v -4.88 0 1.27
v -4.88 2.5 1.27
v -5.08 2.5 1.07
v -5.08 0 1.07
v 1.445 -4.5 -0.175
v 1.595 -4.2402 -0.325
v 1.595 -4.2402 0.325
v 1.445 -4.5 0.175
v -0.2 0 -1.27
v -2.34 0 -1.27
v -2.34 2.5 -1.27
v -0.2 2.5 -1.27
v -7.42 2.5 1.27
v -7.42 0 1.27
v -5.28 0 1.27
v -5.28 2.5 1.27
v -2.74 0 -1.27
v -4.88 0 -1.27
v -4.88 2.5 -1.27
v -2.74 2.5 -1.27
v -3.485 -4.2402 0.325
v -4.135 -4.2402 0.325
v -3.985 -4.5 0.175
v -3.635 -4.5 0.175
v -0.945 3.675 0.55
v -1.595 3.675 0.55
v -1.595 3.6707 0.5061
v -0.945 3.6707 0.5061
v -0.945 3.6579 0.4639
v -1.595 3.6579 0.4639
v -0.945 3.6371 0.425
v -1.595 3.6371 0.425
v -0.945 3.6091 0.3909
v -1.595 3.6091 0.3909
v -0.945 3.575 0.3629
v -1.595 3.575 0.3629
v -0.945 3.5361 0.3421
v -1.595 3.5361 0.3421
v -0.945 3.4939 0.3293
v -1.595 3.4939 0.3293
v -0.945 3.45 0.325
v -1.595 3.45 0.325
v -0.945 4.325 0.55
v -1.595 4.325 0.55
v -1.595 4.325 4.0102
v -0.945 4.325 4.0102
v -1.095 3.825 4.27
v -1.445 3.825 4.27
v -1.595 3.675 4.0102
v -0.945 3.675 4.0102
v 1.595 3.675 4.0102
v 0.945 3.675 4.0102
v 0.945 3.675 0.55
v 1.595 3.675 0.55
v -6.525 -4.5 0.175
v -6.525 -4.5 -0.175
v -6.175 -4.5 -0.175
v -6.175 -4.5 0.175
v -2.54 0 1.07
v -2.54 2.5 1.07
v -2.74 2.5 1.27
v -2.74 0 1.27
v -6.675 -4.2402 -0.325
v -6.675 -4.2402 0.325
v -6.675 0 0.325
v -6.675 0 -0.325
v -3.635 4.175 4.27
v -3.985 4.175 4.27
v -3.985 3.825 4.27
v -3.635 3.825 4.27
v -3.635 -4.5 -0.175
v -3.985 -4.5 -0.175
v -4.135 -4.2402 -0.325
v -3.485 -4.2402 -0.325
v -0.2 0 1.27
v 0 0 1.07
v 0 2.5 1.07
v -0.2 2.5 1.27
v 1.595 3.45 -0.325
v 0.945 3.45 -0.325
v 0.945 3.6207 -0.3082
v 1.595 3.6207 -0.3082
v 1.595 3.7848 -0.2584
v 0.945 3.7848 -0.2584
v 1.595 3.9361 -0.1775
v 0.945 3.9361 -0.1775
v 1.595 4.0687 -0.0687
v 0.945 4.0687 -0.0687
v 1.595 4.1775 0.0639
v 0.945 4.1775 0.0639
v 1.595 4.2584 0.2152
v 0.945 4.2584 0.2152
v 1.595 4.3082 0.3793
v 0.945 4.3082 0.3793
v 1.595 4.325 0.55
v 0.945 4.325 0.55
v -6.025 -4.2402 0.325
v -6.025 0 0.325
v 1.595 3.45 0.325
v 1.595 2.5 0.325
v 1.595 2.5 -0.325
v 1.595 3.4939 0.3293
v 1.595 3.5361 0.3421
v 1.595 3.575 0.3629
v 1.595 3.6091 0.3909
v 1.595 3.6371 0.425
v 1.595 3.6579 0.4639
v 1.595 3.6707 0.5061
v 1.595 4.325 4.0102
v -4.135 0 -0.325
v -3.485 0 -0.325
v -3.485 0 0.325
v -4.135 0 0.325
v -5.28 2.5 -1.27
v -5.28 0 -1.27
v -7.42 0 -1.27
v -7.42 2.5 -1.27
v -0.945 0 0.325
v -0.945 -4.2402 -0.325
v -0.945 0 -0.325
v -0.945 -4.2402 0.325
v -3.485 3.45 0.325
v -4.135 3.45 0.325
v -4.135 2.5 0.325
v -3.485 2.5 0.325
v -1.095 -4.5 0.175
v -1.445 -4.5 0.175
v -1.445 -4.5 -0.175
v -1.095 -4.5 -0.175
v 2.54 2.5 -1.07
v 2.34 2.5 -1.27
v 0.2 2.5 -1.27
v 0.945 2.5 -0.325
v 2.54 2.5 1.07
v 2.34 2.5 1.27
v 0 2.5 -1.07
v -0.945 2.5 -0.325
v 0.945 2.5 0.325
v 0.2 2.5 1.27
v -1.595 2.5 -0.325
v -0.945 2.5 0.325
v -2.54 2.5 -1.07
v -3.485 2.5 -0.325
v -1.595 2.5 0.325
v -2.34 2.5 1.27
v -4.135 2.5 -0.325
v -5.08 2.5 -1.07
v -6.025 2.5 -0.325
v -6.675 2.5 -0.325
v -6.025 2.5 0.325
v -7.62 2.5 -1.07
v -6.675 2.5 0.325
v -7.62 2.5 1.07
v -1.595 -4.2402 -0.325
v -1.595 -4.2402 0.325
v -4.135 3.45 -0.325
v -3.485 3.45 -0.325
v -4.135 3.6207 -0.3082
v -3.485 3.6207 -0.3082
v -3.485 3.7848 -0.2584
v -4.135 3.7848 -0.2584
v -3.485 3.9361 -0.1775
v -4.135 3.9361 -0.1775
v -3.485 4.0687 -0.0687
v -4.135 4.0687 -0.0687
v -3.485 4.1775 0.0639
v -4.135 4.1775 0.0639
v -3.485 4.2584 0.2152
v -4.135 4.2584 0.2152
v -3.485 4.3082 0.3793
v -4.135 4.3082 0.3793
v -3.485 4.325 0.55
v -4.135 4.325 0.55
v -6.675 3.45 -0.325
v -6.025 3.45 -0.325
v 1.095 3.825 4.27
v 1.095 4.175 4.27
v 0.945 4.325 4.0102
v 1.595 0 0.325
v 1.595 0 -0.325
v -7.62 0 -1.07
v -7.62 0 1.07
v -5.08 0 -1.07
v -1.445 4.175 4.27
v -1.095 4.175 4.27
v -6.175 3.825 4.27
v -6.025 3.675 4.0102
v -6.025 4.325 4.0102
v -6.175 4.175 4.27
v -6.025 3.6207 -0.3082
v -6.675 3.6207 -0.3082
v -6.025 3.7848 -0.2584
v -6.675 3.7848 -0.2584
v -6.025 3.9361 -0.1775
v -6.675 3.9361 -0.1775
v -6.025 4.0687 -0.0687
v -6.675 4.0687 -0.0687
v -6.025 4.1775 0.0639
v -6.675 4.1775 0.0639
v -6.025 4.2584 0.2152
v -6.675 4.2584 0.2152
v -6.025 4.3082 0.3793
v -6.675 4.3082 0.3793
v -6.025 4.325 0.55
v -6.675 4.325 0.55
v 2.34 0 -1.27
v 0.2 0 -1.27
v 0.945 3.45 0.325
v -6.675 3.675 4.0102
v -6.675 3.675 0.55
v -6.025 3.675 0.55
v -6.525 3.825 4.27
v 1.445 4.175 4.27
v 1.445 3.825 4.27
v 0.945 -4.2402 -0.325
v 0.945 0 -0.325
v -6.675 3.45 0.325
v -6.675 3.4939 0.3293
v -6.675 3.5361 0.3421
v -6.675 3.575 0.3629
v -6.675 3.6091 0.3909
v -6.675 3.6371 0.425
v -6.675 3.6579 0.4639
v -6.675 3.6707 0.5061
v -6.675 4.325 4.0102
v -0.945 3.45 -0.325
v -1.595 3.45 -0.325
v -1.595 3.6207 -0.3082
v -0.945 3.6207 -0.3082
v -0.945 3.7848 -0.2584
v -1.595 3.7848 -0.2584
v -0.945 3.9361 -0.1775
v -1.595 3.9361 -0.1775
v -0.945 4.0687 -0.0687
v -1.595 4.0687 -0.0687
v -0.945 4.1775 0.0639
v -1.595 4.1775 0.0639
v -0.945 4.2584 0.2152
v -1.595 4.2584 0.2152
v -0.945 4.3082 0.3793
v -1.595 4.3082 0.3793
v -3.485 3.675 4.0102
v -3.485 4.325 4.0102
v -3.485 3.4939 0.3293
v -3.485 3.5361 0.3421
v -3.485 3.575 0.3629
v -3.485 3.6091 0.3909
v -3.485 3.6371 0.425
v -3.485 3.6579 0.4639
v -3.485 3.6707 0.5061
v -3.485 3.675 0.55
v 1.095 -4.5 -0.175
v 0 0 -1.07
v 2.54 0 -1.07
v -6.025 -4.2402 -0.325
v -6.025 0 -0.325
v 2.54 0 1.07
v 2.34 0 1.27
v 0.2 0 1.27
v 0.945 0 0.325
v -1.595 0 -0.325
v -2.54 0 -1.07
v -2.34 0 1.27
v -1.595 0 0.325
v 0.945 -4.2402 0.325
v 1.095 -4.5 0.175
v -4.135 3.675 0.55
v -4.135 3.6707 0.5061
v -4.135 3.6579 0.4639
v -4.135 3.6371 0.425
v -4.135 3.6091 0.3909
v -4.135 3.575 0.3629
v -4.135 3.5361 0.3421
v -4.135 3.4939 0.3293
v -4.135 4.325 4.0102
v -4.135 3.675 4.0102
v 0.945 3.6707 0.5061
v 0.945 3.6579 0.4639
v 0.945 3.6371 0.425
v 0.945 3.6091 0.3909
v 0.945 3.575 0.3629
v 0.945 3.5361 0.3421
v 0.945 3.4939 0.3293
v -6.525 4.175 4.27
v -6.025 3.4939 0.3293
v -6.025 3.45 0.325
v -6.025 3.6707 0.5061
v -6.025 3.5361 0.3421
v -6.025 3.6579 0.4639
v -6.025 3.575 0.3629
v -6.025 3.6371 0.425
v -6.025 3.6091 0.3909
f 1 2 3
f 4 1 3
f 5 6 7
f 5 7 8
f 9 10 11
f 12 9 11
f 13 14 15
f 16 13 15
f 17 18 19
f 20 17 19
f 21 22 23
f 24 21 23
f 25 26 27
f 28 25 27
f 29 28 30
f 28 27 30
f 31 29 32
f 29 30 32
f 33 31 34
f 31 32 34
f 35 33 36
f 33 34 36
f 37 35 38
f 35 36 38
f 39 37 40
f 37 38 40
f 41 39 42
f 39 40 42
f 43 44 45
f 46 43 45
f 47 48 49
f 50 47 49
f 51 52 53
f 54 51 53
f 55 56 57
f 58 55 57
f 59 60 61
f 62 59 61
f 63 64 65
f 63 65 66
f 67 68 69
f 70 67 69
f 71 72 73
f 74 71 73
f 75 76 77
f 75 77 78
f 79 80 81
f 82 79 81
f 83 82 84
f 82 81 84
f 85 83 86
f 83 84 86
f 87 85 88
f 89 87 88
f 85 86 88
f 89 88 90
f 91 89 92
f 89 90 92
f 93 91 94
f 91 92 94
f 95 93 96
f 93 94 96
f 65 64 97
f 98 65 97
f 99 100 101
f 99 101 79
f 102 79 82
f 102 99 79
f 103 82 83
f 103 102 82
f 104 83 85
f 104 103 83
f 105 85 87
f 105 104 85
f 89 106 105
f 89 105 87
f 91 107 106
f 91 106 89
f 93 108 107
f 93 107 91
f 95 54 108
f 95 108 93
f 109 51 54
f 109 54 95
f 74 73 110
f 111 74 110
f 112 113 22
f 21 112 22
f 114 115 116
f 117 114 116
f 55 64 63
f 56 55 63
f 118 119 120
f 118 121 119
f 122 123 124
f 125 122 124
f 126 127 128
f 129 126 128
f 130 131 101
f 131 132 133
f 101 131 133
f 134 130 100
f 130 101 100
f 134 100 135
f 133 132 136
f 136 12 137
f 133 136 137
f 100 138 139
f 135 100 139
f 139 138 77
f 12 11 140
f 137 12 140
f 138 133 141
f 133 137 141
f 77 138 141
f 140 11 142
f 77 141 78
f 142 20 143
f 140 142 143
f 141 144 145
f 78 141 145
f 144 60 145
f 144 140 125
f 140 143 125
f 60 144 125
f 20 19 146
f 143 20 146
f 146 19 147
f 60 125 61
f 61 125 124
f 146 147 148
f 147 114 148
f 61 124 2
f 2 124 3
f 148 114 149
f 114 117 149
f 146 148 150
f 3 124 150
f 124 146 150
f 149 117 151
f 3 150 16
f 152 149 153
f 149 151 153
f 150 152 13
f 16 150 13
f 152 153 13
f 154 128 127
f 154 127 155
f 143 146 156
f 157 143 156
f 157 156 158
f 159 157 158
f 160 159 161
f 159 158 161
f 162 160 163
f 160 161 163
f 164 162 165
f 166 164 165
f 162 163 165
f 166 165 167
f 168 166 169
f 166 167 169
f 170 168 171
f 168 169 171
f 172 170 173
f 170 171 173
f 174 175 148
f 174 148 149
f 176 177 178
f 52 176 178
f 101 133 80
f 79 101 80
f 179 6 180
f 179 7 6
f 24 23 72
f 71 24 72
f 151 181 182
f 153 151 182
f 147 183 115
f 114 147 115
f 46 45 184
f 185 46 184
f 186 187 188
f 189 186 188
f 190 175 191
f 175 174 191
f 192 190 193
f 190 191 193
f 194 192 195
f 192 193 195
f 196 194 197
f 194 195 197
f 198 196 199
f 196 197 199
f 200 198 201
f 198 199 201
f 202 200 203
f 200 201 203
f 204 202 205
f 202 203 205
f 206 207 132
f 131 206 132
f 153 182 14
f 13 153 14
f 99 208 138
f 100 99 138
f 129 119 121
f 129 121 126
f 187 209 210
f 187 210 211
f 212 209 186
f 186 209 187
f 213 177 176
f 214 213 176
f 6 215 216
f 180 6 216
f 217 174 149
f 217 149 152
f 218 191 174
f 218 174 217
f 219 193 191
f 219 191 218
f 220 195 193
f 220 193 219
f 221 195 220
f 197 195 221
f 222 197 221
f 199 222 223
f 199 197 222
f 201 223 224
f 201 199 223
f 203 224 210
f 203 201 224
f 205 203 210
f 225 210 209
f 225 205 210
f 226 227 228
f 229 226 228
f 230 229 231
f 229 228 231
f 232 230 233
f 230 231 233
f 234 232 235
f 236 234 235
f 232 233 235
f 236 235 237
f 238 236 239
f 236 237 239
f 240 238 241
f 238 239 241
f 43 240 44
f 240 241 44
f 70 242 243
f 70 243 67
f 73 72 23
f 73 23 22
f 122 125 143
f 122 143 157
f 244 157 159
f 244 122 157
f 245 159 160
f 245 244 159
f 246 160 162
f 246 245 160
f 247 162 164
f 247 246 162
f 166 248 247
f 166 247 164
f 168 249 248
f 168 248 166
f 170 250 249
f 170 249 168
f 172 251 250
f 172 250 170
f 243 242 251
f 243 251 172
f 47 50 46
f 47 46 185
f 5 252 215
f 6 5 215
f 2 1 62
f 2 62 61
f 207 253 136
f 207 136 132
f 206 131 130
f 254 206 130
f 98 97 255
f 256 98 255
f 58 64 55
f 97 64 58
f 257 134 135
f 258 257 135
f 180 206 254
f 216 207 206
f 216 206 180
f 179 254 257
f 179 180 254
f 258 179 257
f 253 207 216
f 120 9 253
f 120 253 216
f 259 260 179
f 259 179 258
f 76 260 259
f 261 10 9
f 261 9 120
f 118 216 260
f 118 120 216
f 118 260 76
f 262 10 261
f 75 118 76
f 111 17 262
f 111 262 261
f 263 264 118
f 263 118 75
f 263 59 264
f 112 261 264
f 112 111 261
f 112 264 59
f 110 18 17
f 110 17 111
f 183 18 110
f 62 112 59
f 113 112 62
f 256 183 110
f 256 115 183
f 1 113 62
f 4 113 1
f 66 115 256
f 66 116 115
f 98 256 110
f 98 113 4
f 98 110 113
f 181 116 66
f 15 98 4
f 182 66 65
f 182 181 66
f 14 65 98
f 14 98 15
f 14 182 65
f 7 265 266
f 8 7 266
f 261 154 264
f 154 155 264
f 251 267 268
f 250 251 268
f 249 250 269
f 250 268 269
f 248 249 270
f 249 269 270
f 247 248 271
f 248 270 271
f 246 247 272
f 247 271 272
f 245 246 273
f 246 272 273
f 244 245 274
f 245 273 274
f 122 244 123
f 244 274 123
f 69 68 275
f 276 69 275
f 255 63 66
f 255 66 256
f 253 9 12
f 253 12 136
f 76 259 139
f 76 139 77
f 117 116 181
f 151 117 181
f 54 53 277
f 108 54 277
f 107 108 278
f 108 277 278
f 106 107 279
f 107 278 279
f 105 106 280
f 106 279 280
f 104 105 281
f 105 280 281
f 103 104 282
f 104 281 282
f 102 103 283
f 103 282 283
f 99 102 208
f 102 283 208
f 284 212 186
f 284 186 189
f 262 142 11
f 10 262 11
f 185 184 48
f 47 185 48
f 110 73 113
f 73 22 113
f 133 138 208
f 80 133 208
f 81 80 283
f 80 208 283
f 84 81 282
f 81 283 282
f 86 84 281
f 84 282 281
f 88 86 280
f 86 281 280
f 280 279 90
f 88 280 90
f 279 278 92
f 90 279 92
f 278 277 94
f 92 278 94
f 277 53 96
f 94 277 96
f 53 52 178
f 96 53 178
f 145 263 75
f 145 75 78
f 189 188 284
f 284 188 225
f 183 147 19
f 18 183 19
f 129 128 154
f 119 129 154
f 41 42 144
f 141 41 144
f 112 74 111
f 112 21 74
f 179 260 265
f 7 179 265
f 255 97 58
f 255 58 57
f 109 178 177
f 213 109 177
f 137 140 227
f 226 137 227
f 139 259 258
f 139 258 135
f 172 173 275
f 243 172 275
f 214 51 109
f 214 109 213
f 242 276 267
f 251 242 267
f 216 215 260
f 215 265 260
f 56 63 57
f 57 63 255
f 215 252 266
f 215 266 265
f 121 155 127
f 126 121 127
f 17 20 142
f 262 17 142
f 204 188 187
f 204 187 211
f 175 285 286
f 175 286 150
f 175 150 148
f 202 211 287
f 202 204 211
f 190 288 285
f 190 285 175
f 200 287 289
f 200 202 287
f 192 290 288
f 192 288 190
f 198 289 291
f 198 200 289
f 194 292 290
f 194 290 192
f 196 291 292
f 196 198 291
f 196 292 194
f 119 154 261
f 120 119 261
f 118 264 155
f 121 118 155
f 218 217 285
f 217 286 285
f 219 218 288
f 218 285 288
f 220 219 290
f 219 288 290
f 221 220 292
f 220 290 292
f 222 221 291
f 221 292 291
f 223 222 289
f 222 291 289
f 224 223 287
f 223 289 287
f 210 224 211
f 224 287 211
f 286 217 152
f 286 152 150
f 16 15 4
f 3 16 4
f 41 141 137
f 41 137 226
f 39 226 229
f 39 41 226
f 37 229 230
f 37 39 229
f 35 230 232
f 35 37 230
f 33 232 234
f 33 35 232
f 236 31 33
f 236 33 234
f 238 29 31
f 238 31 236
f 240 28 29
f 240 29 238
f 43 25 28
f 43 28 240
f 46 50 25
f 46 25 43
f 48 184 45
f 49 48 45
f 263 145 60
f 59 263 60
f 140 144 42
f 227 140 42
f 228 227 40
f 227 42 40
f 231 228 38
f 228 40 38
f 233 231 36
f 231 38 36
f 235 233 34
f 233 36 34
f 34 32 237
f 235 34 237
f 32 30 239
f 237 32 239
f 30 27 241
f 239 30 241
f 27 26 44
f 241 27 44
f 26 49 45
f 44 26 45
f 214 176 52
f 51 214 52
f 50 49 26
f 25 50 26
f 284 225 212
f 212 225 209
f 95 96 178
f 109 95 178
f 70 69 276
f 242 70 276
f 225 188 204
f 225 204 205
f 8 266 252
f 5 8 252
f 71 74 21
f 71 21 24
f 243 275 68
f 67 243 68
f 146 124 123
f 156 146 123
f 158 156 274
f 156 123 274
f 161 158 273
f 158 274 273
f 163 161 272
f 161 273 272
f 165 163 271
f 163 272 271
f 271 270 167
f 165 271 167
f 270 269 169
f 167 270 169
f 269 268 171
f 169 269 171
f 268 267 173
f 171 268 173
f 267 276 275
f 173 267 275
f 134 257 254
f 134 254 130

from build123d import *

# Parameters (mm, degrees)
BOSS_EXTRUDE1_DEPTH = 2.5
SKETCH3_W           = 0.65
SKETCH3_H           = 0.65
BOSS_EXTRUDE2_DEPTH = 6
SKETCH4_W           = 0.65
SKETCH4_H           = 0.65
CHAMFER3_SIZE       = 0.15
CHAMFER3_SIZE2      = 0.259807621
CHAMFER2_SIZE       = 0.15
CHAMFER2_SIZE2      = 0.259807621
LPATTERN2_START     = -5.08
LPATTERN2_OUTLINE_W = 2.5
LPATTERN2_OUTLINE_H = 2.54
LPATTERN2_DEPTH     = 7.62
LPATTERN2_START_2   = -4.135
LPATTERN2_2_DEPTH   = 0.65
LPATTERN2_START_3   = -1.595
LPATTERN2_3_DEPTH   = 0.65
LPATTERN2_START_4   = 0.945
LPATTERN2_4_DEPTH   = 0.65
LPATTERN2_START_5   = -4.240192379
LPATTERN2_5_DEPTH   = 9.240192379
LPATTERN2_START_6   = -1
LPATTERN2_6_DEPTH   = 2


with BuildPart() as part:
    # Sketch1 → Boss-Extrude1 (new body)
    with BuildSketch(Plane(origin=(0, 0, 0), x_dir=(1, 0, 0), z_dir=(0, 1, 0))):
        Polygon((-7.42, 1.27), (-7.62, 1.07), (-7.62, -1.07), (-7.42, -1.27), (-5.28, -1.27), (-5.08, -1.07), (-5.08, 1.07), (-5.28, 1.27), align=None)
    extrude(amount=BOSS_EXTRUDE1_DEPTH)

    # Sketch3 → Boss-Extrude2 (add)
    with BuildSketch(Plane(origin=(0, -4.5, 0), x_dir=(1, 0, 0), z_dir=(0, 1, 0))):
        with Locations((-6.35, 0)):
            Rectangle(SKETCH3_W, SKETCH3_H)
    extrude(amount=BOSS_EXTRUDE2_DEPTH)

    # Sweep1: sweep along a path in Sketch5
    with BuildLine(Plane.ZY.offset(6.35)) as sweep1_path:
        Line((0, 2.5), (0, 3.45))
        ThreePointArc((0, 3.45), (0.16109127, 3.83890873), (0.55, 4))
        Line((0.55, 4), (4.27, 4))
    # Sketch4 → Sweep1 (sweep)
    with BuildSketch(Plane(origin=(0, 2.5, 0), x_dir=(1, 0, 0), z_dir=(0, 1, 0))):
        with Locations((-6.35, 0)):
            Rectangle(SKETCH4_W, SKETCH4_H)
    sweep(path=sweep1_path.line)

    # Chamfer3
    chamfer3_edges = [part.edges().sort_by_distance(p)[0] for p in [
        (-6.675, 4, 4.27),
        (-6.35, 3.675, 4.27),
        (-6.025, 4, 4.27),
        (-6.35, 4.325, 4.27),
    ]]
    chamfer3_side = [part.faces().sort_by_distance(p)[0] for p in [
        (-6.35, 4, 4.27),
    ]]
    chamfer(chamfer3_edges, length=CHAMFER3_SIZE, length2=CHAMFER3_SIZE2, reference=chamfer3_side[0])

    # Chamfer2
    chamfer2_edges = [part.edges().sort_by_distance(p)[0] for p in [
        (-6.025, -4.5, 0),
        (-6.35, -4.5, -0.325),
        (-6.675, -4.5, 0),
        (-6.35, -4.5, 0.325),
    ]]
    chamfer2_side = [part.faces().sort_by_distance(p)[0] for p in [
        (-6.35, -4.5, 0),
    ]]
    chamfer(chamfer2_edges, length=CHAMFER2_SIZE, length2=CHAMFER2_SIZE2, reference=chamfer2_side[0])

    # LPattern2: read off the stored shape, not the designer's step
    # LPattern2 outline → LPattern2 (add)
    with BuildSketch(Plane.YZ.offset(LPATTERN2_START)):
        with Locations((1.25, 0)):
            Rectangle(LPATTERN2_OUTLINE_W, LPATTERN2_OUTLINE_H)
    extrude(amount=LPATTERN2_DEPTH)

    # LPattern2 2 outline → LPattern2 2 (add)
    with BuildSketch(Plane.YZ.offset(LPATTERN2_START_2)):
        Polygon((0, -0.325), (0, 0.325), (-4.240192379, 0.325), (-4.5, 0.175), (-4.5, -0.175), (-4.240192379, -0.325), align=None)
        with BuildLine():
            Line((3.45, 0.325), (2.5, 0.325))
            Line((2.5, 0.325), (2.5, -0.325))
            Line((2.5, -0.325), (3.45, -0.325))
            ThreePointArc((3.45, -0.325), (4.068718434, -0.068718434), (4.325, 0.55))
            Line((4.325, 0.55), (4.325, 4.010192379))
            Line((4.325, 4.010192379), (4.175, 4.27))
            Line((4.175, 4.27), (3.825, 4.27))
            Line((3.825, 4.27), (3.675, 4.010192379))
            Line((3.675, 4.010192379), (3.675, 0.55))
            ThreePointArc((3.675, 0.55), (3.609099026, 0.390900974), (3.45, 0.325))
        make_face()
    extrude(amount=LPATTERN2_2_DEPTH)

    # LPattern2 3 outline → LPattern2 3 (add)
    with BuildSketch(Plane.YZ.offset(LPATTERN2_START_3)):
        Polygon((0, -0.325), (0, 0.325), (-4.240192379, 0.325), (-4.5, 0.175), (-4.5, -0.175), (-4.240192379, -0.325), align=None)
        with BuildLine():
            Line((3.45, 0.325), (2.5, 0.325))
            Line((2.5, 0.325), (2.5, -0.325))
            Line((2.5, -0.325), (3.45, -0.325))
            ThreePointArc((3.45, -0.325), (4.068718434, -0.068718434), (4.325, 0.55))
            Line((4.325, 0.55), (4.325, 4.010192379))
            Line((4.325, 4.010192379), (4.175, 4.27))
            Line((4.175, 4.27), (3.825, 4.27))
            Line((3.825, 4.27), (3.675, 4.010192379))
            Line((3.675, 4.010192379), (3.675, 0.55))
            ThreePointArc((3.675, 0.55), (3.609099026, 0.390900974), (3.45, 0.325))
        make_face()
    extrude(amount=LPATTERN2_3_DEPTH)

    # LPattern2 4 outline → LPattern2 4 (add)
    with BuildSketch(Plane.YZ.offset(LPATTERN2_START_4)):
        Polygon((0, -0.325), (0, 0.325), (-4.240192379, 0.325), (-4.5, 0.175), (-4.5, -0.175), (-4.240192379, -0.325), align=None)
        with BuildLine():
            Line((3.45, 0.325), (2.5, 0.325))
            Line((2.5, 0.325), (2.5, -0.325))
            Line((2.5, -0.325), (3.45, -0.325))
            ThreePointArc((3.45, -0.325), (4.068718434, -0.068718434), (4.325, 0.55))
            Line((4.325, 0.55), (4.325, 4.010192379))
            Line((4.325, 4.010192379), (4.175, 4.27))
            Line((4.175, 4.27), (3.825, 4.27))
            Line((3.825, 4.27), (3.675, 4.010192379))
            Line((3.675, 4.010192379), (3.675, 0.55))
            ThreePointArc((3.675, 0.55), (3.609099026, 0.390900974), (3.45, 0.325))
        make_face()
    extrude(amount=LPATTERN2_4_DEPTH)

    # LPattern2 5 outline → LPattern2 5 (cut)
    with BuildSketch(Plane(origin=(0, 0, 0), x_dir=(1, 0, 0), z_dir=(0, 1, 0)).offset(LPATTERN2_START_5)):
        Polygon((-5.08, 1.27), (-5.08, 1.07), (-4.88, 1.27), align=None)
        Polygon((-5.08, -1.27), (-4.88, -1.27), (-5.08, -1.07), align=None)
        Polygon((-2.74, -1.27), (-2.34, -1.27), (-2.54, -1.07), align=None)
        Polygon((-0.2, -1.27), (0.2, -1.27), (0, -1.07), align=None)
        Polygon((2.54, -1.27), (2.54, -1.07), (2.34, -1.27), align=None)
        Polygon((2.54, 1.27), (2.34, 1.27), (2.54, 1.07), align=None)
        Polygon((0.2, 1.27), (-0.2, 1.27), (0, 1.07), align=None)
        Polygon((-2.34, 1.27), (-2.74, 1.27), (-2.54, 1.07), align=None)
        Polygon((1.595, -4.27), (1.595, -4.010192379), (1.445, -4.27), align=None)
        Polygon((1.095, -4.27), (0.945, -4.010192379), (0.945, -4.27), align=None)
        Polygon((-0.945, -4.27), (-0.945, -4.010192379), (-1.095, -4.27), align=None)
        Polygon((-1.445, -4.27), (-1.595, -4.010192379), (-1.595, -4.27), align=None)
        Polygon((-3.485, -4.27), (-3.485, -4.010192379), (-3.635, -4.27), align=None)
        Polygon((-3.985, -4.27), (-4.135, -4.010192379), (-4.135, -4.27), align=None)
    extrude(amount=LPATTERN2_5_DEPTH, mode=Mode.SUBTRACT)

    # LPattern2 6 outline → LPattern2 6 (cut)
    with BuildSketch(Plane.XY.offset(LPATTERN2_START_6)):
        Polygon((-3.485, -4.5), (-3.485, -4.240192379), (-3.635, -4.5), align=None)
        Polygon((-4.135, -4.5), (-3.985, -4.5), (-4.135, -4.240192379), align=None)
        Polygon((-0.945, -4.5), (-0.945, -4.240192379), (-1.095, -4.5), align=None)
        Polygon((-1.595, -4.5), (-1.445, -4.5), (-1.595, -4.240192379), align=None)
        Polygon((1.595, -4.5), (1.595, -4.240192379), (1.445, -4.5), align=None)
        Polygon((0.945, -4.5), (1.095, -4.5), (0.945, -4.240192379), align=None)
    extrude(amount=LPATTERN2_6_DEPTH, mode=Mode.SUBTRACT)


solid = part.part
